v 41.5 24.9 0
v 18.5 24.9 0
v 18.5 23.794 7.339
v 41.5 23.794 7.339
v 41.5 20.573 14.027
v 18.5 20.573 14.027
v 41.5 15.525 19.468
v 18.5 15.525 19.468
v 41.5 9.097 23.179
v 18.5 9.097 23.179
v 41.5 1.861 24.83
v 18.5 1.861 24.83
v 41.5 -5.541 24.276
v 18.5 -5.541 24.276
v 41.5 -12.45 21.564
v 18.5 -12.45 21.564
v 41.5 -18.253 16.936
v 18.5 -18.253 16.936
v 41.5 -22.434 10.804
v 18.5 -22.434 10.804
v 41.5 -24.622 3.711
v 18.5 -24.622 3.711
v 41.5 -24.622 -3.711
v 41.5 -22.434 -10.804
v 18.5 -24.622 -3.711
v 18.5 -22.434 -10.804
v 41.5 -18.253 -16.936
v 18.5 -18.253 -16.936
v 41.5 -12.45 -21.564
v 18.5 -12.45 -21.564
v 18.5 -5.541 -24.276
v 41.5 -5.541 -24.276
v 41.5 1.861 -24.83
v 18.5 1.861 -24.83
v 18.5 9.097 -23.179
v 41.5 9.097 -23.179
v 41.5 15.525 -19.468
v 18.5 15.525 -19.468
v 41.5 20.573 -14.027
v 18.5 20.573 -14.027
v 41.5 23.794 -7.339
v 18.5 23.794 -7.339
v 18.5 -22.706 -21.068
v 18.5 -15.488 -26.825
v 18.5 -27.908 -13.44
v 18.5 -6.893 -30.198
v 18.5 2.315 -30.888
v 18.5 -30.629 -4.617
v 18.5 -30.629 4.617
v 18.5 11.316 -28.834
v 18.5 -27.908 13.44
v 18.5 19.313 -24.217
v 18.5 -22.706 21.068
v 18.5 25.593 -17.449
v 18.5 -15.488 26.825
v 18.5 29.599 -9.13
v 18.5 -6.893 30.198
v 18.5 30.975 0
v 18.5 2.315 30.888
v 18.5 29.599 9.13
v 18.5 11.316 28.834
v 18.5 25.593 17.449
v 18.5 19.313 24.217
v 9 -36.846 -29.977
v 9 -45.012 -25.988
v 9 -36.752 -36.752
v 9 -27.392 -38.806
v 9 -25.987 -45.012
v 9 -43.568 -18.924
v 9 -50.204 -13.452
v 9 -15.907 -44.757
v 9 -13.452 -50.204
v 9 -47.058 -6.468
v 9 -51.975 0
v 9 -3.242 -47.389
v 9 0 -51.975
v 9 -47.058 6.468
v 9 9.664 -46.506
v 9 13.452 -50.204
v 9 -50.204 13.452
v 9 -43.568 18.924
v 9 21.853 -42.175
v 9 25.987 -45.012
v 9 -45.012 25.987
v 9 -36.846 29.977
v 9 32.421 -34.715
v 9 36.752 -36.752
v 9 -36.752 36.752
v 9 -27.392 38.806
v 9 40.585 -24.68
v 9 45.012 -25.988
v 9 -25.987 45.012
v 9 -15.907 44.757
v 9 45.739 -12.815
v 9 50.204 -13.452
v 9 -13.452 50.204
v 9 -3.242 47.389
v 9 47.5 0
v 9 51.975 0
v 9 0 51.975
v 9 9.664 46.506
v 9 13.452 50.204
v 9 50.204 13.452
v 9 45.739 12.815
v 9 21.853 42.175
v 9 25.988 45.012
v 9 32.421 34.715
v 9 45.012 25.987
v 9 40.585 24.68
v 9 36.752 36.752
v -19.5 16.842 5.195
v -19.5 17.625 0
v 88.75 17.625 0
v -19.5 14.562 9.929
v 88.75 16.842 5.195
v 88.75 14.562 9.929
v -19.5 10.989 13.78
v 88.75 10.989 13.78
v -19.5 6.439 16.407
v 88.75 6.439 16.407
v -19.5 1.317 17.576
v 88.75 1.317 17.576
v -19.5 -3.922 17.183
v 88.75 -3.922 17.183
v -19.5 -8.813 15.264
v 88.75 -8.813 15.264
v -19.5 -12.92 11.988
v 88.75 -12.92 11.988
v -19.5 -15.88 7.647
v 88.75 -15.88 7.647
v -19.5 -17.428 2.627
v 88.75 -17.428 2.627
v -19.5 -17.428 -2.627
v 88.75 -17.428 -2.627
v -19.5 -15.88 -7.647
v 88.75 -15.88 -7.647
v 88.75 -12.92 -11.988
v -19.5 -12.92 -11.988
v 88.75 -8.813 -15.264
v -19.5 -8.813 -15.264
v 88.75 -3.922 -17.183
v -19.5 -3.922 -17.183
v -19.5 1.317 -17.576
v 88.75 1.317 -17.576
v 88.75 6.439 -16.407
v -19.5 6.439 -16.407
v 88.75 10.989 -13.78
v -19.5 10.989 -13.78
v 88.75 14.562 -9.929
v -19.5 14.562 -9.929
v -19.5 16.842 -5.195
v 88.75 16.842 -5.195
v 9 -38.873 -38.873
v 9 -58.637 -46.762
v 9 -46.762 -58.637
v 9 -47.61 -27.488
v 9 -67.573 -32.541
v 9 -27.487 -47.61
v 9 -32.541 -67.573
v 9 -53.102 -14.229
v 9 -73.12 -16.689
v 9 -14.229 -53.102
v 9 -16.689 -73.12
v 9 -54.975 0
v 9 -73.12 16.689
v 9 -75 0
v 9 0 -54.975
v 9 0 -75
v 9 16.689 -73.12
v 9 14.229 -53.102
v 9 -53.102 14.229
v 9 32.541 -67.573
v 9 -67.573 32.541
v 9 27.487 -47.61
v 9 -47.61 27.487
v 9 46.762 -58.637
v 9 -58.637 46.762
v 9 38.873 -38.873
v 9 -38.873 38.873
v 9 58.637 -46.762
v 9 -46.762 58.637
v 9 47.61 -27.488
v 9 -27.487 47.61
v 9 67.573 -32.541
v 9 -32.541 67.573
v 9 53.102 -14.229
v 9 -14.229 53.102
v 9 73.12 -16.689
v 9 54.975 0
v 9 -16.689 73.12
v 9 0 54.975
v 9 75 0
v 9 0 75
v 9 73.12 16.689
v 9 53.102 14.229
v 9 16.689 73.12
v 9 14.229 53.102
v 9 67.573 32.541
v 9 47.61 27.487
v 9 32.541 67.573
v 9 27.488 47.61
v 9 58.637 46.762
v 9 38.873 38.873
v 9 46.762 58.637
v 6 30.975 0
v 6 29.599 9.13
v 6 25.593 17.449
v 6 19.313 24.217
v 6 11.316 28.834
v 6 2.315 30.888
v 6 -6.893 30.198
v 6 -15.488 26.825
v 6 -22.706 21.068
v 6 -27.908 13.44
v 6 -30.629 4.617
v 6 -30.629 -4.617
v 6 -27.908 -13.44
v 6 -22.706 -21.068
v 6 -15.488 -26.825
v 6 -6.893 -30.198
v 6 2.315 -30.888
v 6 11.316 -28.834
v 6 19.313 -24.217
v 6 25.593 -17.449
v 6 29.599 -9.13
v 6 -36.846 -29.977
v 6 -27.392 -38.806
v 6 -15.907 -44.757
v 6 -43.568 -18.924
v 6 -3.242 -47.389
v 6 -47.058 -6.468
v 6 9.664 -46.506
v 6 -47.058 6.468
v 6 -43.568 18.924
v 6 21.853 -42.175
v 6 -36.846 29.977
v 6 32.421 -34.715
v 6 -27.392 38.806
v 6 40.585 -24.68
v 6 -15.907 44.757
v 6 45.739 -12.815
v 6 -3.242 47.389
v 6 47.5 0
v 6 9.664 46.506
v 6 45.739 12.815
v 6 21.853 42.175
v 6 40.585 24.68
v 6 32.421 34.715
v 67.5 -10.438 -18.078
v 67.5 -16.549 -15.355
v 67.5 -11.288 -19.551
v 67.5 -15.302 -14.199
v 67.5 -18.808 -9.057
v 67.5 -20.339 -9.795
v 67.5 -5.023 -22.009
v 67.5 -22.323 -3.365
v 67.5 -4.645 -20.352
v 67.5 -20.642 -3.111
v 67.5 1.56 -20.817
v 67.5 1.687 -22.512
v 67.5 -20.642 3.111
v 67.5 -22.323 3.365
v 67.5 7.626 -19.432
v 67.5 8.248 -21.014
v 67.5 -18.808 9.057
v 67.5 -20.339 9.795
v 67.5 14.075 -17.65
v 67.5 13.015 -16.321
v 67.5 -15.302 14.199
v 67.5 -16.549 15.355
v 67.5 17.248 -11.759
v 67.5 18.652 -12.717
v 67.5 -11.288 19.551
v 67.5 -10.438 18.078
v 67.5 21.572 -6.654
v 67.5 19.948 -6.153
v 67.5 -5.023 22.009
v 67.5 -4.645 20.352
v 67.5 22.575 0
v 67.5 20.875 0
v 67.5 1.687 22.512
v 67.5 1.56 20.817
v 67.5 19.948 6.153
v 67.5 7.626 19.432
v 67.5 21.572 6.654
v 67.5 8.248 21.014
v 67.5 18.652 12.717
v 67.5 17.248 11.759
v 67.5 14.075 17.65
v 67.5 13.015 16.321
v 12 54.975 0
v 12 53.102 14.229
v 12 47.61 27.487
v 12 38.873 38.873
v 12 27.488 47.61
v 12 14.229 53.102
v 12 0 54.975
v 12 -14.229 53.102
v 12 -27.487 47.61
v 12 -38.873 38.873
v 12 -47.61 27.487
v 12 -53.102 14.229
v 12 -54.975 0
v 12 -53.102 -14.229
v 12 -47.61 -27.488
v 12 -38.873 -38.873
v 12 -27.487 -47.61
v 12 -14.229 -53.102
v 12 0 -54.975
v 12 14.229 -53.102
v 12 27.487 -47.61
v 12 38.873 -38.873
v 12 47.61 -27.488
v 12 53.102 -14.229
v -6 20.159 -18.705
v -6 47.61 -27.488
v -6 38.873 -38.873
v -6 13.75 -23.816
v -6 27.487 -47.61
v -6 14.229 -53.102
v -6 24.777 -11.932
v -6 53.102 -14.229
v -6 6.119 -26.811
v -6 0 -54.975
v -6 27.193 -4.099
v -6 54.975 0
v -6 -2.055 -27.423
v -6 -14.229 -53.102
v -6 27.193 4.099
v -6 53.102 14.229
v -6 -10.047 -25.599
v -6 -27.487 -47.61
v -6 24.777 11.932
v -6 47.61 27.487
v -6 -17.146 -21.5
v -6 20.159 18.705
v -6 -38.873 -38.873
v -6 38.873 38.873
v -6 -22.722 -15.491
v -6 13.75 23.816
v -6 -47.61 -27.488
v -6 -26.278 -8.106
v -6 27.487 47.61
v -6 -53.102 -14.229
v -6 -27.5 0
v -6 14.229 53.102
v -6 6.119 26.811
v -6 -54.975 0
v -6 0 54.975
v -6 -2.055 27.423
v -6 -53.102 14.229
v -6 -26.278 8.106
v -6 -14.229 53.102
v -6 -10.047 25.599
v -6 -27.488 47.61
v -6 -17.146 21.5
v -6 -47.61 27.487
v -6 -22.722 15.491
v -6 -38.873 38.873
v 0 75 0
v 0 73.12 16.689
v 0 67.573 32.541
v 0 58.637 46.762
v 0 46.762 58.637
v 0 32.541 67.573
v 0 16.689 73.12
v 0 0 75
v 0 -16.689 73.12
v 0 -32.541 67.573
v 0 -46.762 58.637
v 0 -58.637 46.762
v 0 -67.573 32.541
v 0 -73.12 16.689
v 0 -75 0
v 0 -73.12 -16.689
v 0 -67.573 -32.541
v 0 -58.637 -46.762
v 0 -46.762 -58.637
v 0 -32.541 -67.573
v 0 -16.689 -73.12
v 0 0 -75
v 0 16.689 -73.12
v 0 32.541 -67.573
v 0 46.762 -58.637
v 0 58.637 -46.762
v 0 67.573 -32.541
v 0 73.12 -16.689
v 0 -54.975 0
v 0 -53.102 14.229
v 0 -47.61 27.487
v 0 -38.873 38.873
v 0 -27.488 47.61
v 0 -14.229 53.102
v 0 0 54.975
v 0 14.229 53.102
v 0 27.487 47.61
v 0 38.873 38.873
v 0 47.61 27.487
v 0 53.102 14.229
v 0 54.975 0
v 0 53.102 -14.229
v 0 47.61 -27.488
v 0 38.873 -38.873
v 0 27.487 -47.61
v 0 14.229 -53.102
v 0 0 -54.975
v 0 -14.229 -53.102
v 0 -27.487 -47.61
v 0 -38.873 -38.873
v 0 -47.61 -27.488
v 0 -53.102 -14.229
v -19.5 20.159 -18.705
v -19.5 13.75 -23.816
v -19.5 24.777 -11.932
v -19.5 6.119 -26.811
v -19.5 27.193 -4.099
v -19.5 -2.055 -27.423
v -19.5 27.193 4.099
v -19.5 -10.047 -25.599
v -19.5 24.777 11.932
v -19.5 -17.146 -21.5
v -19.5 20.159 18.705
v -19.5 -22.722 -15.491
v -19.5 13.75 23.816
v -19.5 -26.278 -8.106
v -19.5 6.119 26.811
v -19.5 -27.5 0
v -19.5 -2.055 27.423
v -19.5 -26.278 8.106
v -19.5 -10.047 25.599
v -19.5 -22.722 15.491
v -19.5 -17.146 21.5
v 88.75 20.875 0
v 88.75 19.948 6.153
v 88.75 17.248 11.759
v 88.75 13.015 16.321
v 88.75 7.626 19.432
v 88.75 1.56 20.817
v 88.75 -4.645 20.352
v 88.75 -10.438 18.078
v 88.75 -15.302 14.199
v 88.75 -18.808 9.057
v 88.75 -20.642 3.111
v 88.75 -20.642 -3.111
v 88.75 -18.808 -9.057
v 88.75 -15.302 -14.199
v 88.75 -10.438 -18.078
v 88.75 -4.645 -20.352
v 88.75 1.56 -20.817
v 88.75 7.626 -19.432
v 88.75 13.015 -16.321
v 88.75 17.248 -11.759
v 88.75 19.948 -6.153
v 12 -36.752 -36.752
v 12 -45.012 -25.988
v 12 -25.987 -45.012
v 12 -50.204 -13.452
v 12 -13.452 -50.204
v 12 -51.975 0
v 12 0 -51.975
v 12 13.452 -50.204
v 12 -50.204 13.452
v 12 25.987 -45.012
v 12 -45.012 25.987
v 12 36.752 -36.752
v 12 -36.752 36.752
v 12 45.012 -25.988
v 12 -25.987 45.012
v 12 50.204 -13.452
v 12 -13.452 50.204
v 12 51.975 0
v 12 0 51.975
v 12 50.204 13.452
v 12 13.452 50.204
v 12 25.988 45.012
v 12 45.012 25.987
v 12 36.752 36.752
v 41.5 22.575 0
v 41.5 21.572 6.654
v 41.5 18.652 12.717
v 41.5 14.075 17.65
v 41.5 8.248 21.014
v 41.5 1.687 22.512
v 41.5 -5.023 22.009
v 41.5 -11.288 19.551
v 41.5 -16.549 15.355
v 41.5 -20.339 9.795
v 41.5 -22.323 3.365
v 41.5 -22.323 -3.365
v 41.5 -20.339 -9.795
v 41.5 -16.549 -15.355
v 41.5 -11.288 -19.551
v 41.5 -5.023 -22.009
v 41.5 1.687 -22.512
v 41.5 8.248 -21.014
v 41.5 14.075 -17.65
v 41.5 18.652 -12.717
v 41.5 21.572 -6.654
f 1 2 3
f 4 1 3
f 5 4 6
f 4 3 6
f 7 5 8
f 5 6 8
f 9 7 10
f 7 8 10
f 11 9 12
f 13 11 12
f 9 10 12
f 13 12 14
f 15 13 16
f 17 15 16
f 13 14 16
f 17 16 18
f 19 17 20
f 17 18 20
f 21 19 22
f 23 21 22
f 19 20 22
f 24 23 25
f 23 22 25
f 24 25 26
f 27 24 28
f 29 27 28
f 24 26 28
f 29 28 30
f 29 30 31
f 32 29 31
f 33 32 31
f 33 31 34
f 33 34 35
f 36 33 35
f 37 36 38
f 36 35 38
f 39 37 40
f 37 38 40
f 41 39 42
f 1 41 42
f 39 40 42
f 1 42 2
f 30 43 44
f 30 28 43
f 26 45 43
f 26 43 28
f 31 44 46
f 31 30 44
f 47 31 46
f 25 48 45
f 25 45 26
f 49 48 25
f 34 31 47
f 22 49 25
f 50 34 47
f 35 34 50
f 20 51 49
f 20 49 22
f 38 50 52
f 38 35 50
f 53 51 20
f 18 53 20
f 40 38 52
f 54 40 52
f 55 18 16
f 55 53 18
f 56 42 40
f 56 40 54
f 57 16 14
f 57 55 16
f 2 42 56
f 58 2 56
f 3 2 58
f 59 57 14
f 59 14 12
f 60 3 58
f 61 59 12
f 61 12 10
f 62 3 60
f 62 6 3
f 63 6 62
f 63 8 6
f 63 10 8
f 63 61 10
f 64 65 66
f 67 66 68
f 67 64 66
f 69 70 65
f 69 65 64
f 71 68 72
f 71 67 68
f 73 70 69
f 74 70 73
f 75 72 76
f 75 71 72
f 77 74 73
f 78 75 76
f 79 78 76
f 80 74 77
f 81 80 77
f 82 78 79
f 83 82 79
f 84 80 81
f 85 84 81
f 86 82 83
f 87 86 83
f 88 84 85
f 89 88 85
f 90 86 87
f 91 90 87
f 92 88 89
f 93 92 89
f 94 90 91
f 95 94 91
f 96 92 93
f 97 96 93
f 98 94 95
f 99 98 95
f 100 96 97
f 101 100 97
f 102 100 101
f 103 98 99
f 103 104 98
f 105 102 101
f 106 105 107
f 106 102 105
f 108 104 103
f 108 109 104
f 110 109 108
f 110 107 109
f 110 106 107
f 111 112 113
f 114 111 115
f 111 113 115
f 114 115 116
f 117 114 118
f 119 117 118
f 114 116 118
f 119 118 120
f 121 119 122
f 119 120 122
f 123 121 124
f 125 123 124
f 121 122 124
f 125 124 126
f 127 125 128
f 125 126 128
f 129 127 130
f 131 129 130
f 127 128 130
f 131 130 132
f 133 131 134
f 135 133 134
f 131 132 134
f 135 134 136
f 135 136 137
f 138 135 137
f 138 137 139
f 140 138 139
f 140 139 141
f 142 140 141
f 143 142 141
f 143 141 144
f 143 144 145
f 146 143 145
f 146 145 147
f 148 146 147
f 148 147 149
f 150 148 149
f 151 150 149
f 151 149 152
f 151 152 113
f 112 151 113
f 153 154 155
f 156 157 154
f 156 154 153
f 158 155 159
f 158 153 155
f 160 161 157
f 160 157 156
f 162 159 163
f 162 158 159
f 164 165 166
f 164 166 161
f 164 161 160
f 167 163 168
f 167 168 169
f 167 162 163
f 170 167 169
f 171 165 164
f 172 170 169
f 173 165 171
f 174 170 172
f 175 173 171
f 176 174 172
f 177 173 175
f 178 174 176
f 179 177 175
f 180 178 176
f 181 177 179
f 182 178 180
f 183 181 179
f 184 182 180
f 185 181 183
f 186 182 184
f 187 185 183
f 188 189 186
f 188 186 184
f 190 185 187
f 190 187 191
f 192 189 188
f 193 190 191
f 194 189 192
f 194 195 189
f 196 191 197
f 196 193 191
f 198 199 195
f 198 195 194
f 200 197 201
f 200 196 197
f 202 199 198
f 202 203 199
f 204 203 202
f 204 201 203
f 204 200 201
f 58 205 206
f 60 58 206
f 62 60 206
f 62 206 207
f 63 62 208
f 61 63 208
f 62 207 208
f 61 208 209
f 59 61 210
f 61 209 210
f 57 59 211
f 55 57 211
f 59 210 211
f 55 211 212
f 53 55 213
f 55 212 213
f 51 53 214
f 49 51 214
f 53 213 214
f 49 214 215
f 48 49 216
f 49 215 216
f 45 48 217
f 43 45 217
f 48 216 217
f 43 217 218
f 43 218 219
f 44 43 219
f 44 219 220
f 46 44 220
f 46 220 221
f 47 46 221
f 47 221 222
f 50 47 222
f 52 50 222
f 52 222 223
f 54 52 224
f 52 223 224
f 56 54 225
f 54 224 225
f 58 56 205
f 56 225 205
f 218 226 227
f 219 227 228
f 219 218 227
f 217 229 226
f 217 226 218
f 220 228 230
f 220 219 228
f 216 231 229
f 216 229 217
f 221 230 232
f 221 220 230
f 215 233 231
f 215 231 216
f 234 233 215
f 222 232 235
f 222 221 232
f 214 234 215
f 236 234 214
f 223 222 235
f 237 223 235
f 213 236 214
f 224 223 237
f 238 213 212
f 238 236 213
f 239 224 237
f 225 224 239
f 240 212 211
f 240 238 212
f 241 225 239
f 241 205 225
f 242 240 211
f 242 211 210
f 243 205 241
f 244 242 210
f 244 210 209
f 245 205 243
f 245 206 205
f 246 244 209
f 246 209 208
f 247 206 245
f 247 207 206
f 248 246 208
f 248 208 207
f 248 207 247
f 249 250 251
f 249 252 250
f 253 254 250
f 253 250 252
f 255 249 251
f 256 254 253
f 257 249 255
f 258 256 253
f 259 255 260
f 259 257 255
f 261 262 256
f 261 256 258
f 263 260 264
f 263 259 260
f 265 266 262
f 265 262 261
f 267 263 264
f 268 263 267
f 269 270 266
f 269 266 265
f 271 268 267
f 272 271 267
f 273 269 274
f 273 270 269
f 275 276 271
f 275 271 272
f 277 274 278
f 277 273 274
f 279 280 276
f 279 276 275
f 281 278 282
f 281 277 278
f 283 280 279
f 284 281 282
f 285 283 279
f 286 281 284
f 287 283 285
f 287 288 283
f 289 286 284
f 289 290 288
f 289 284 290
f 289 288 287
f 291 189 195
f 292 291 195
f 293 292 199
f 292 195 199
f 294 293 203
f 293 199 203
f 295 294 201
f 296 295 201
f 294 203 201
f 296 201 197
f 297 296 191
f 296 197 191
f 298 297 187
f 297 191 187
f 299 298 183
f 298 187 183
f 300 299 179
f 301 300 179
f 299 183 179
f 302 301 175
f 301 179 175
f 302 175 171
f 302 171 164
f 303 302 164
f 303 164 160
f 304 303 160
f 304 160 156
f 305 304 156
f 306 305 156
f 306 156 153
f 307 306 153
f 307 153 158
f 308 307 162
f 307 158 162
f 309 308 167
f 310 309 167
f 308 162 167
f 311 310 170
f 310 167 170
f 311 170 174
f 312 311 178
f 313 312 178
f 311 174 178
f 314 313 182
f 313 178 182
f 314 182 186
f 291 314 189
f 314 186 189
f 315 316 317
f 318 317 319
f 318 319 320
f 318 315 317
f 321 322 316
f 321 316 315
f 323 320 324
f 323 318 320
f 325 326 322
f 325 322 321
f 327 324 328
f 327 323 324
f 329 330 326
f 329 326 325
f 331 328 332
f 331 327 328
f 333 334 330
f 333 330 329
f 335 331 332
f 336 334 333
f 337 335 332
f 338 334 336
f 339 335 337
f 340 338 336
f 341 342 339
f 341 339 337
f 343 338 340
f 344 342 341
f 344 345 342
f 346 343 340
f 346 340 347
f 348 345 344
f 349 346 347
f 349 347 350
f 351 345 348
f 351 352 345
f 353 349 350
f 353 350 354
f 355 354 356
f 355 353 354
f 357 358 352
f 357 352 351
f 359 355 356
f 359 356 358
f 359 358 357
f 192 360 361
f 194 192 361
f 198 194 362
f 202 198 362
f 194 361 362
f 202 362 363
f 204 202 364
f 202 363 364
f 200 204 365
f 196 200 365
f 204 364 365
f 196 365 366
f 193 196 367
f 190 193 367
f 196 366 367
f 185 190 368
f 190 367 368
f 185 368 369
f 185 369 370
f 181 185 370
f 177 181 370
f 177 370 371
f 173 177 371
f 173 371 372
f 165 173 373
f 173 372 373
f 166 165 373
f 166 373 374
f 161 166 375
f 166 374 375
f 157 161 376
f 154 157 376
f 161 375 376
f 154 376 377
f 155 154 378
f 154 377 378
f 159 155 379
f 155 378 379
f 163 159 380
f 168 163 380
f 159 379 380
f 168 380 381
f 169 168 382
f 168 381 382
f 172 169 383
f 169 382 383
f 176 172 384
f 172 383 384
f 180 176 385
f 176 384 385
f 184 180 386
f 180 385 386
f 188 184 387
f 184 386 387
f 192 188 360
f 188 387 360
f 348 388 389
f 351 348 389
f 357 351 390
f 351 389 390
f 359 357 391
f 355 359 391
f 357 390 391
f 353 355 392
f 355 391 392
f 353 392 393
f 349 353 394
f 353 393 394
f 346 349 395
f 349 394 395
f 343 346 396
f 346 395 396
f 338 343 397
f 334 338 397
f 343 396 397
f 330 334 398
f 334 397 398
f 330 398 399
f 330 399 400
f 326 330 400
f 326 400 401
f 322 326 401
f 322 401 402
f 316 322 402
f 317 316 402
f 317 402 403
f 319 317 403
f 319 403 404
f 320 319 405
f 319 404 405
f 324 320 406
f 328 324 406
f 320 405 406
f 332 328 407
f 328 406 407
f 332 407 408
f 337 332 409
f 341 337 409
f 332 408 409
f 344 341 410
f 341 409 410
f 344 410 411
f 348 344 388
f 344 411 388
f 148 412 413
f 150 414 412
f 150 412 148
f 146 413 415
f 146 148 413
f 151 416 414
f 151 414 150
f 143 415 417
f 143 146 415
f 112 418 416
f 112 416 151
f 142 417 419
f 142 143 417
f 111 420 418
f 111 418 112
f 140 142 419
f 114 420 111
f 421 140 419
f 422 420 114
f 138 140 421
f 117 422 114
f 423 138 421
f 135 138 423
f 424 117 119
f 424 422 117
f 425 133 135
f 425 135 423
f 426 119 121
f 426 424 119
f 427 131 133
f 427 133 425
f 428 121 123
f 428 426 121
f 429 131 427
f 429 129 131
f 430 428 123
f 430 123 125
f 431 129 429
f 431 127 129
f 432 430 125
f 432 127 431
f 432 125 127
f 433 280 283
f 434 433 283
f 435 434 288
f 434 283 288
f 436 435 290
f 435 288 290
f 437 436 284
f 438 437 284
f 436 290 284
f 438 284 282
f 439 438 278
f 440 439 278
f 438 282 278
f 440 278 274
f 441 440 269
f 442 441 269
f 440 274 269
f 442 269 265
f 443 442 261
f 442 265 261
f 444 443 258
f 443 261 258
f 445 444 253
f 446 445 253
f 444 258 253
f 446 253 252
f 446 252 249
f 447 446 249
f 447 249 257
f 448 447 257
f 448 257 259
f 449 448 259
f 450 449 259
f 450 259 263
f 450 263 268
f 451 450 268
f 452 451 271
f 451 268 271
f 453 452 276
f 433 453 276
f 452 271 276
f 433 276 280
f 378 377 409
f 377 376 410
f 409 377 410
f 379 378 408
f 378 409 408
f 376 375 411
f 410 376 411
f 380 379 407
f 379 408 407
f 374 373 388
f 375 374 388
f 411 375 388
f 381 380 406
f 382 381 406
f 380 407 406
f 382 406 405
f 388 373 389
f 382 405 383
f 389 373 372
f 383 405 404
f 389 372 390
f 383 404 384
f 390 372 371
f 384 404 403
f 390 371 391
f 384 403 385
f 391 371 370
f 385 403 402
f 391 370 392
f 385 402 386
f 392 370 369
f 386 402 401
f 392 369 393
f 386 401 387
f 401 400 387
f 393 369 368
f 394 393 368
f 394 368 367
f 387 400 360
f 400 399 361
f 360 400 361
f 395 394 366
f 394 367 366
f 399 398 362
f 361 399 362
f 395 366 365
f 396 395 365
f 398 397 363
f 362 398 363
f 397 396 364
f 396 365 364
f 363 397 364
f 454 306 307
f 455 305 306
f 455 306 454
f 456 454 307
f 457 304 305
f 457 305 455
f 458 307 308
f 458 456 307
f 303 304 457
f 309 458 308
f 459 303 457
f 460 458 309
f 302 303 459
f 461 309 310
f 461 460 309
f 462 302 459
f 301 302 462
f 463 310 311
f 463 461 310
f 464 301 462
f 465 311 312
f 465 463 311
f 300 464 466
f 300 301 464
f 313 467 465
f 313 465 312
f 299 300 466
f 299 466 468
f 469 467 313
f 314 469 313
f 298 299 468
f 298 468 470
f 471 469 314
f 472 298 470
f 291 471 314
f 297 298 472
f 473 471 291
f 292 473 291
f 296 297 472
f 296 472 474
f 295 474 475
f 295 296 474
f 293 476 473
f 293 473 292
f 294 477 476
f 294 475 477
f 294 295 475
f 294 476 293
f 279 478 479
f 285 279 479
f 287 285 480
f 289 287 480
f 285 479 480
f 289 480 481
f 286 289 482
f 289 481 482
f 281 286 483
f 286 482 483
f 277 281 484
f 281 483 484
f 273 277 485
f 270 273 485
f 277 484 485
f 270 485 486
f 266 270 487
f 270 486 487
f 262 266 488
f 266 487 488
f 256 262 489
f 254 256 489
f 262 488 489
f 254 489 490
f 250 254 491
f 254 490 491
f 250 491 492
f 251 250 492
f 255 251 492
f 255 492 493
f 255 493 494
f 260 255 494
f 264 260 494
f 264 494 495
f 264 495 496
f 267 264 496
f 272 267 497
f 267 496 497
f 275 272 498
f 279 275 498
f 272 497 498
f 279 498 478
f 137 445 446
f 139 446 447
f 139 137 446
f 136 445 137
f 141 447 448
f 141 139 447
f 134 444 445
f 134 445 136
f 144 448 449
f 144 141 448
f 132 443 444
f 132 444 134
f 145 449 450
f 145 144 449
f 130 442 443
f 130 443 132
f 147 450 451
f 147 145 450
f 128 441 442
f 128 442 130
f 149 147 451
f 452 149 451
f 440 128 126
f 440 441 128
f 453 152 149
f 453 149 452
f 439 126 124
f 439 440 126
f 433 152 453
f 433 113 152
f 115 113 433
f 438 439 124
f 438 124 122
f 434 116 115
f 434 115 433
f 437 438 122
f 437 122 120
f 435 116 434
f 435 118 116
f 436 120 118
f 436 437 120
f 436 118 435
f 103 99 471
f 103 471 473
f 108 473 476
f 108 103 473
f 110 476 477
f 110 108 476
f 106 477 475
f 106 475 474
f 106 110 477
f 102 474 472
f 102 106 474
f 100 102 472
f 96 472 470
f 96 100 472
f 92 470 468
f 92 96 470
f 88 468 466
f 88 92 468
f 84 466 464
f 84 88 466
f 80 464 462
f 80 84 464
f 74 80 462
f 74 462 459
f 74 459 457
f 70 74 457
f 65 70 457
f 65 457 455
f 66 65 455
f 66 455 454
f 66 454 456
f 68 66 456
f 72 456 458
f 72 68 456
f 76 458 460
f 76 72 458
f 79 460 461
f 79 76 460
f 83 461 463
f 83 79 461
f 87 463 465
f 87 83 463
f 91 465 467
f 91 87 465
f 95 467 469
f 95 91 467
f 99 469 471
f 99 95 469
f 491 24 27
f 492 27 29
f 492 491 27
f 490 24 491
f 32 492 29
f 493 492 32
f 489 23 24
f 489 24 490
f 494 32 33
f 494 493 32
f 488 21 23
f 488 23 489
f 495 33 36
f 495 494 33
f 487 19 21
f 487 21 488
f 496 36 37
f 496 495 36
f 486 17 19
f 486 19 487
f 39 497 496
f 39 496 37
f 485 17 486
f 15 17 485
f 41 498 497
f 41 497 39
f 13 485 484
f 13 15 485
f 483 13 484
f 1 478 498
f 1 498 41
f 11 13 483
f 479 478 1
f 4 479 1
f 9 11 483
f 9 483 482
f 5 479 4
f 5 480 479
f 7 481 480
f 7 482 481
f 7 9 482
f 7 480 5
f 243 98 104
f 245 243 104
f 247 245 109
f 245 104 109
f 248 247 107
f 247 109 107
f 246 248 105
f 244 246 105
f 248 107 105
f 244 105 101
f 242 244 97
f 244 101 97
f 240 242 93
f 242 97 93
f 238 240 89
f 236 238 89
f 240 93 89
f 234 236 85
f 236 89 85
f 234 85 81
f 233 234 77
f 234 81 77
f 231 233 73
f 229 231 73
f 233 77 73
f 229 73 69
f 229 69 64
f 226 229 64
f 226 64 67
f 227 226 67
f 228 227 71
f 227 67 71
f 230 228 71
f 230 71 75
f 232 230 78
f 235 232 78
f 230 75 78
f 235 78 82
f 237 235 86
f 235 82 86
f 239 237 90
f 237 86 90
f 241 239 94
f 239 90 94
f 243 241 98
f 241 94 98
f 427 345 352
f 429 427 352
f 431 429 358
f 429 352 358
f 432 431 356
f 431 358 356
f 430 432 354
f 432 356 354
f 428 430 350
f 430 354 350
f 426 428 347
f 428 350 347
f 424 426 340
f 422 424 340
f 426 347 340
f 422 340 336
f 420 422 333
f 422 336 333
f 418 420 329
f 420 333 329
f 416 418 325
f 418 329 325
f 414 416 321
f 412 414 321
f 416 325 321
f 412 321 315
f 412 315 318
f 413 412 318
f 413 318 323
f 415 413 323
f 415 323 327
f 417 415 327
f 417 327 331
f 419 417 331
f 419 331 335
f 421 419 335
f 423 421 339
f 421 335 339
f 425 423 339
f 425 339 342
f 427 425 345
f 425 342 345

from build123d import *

# Parameters (mm, degrees)
F0_R           = 75
F1_DEPTH       = 9
F2_R           = 54.975
F2_R_2         = 51.975
F3_DEPTH       = 3
F4_R           = 47.5
F5_DEPTH       = 3
F6_R           = 54.975
F7_DEPTH       = 6
F8_R           = 30.975
F9_DEPTH       = 12.5
F10_R          = 24.9
F11_DEPTH      = 23
F12_R          = 22.575
F13_DEPTH      = 26
F14_R          = 20.875
F15_DEPTH      = 21.25
F16_R          = 27.5
F17_DEPTH      = 13.5
F18_R          = 16.825
F19_DEPTH      = 19.501
F19_DEPTH_BACK = 88.751
F20_R          = 17.625
F21_DEPTH      = 122


with BuildPart() as f1:
    # F0 (on Right) → F1 (new body)
    with BuildSketch(Plane.YZ):
        Circle(F0_R)
    extrude(amount=F1_DEPTH)

    # F2 (on face) → F3 (join)
    with BuildSketch(Plane.YZ.offset(9)):
        Circle(F2_R)
        Circle(F2_R_2, mode=Mode.SUBTRACT)
    extrude(amount=F3_DEPTH)

    # F4 (on face) → F5 (cut)
    with BuildSketch(Plane.YZ.offset(9)):
        Circle(F4_R)
    extrude(amount=-F5_DEPTH, mode=Mode.SUBTRACT)

    # F6 (on face) → F7 (join)
    with BuildSketch(Plane(origin=(0, 0, 0), x_dir=(0, -1, 0), z_dir=(-1, 0, 0))):
        Circle(F6_R)
    extrude(amount=F7_DEPTH)

    # F8 (on face) → F9 (join)
    with BuildSketch(Plane.YZ.offset(6)):
        Circle(F8_R)
    extrude(amount=F9_DEPTH)

    # F10 (on face) → F11 (join)
    with BuildSketch(Plane.YZ.offset(18.5)):
        Circle(F10_R)
    extrude(amount=F11_DEPTH)

    # F12 (on face) → F13 (join)
    with BuildSketch(Plane.YZ.offset(41.5)):
        Circle(F12_R)
    extrude(amount=F13_DEPTH)

    # F14 (on face) → F15 (join)
    with BuildSketch(Plane.YZ.offset(67.5)):
        Circle(F14_R)
    extrude(amount=F15_DEPTH)

    # F16 (on face) → F17 (join)
    with BuildSketch(Plane(origin=(-6, 0, 0), x_dir=(0, -1, 0), z_dir=(-1, 0, 0))):
        Circle(F16_R)
    extrude(amount=F17_DEPTH)

    # F18 (on Right) → F19 (cut, two sides)
    with BuildSketch(Plane.YZ) as f19_sk:
        Circle(F18_R)
    extrude(amount=-F19_DEPTH, mode=Mode.SUBTRACT)
    extrude(f19_sk.sketch, amount=-F19_DEPTH_BACK, mode=Mode.SUBTRACT)

    # F20 (on face) → F21 (cut)
    with BuildSketch(Plane.YZ.offset(88.75)):
        Circle(F20_R)
    extrude(amount=-F21_DEPTH, mode=Mode.SUBTRACT)


solid = f1.part
